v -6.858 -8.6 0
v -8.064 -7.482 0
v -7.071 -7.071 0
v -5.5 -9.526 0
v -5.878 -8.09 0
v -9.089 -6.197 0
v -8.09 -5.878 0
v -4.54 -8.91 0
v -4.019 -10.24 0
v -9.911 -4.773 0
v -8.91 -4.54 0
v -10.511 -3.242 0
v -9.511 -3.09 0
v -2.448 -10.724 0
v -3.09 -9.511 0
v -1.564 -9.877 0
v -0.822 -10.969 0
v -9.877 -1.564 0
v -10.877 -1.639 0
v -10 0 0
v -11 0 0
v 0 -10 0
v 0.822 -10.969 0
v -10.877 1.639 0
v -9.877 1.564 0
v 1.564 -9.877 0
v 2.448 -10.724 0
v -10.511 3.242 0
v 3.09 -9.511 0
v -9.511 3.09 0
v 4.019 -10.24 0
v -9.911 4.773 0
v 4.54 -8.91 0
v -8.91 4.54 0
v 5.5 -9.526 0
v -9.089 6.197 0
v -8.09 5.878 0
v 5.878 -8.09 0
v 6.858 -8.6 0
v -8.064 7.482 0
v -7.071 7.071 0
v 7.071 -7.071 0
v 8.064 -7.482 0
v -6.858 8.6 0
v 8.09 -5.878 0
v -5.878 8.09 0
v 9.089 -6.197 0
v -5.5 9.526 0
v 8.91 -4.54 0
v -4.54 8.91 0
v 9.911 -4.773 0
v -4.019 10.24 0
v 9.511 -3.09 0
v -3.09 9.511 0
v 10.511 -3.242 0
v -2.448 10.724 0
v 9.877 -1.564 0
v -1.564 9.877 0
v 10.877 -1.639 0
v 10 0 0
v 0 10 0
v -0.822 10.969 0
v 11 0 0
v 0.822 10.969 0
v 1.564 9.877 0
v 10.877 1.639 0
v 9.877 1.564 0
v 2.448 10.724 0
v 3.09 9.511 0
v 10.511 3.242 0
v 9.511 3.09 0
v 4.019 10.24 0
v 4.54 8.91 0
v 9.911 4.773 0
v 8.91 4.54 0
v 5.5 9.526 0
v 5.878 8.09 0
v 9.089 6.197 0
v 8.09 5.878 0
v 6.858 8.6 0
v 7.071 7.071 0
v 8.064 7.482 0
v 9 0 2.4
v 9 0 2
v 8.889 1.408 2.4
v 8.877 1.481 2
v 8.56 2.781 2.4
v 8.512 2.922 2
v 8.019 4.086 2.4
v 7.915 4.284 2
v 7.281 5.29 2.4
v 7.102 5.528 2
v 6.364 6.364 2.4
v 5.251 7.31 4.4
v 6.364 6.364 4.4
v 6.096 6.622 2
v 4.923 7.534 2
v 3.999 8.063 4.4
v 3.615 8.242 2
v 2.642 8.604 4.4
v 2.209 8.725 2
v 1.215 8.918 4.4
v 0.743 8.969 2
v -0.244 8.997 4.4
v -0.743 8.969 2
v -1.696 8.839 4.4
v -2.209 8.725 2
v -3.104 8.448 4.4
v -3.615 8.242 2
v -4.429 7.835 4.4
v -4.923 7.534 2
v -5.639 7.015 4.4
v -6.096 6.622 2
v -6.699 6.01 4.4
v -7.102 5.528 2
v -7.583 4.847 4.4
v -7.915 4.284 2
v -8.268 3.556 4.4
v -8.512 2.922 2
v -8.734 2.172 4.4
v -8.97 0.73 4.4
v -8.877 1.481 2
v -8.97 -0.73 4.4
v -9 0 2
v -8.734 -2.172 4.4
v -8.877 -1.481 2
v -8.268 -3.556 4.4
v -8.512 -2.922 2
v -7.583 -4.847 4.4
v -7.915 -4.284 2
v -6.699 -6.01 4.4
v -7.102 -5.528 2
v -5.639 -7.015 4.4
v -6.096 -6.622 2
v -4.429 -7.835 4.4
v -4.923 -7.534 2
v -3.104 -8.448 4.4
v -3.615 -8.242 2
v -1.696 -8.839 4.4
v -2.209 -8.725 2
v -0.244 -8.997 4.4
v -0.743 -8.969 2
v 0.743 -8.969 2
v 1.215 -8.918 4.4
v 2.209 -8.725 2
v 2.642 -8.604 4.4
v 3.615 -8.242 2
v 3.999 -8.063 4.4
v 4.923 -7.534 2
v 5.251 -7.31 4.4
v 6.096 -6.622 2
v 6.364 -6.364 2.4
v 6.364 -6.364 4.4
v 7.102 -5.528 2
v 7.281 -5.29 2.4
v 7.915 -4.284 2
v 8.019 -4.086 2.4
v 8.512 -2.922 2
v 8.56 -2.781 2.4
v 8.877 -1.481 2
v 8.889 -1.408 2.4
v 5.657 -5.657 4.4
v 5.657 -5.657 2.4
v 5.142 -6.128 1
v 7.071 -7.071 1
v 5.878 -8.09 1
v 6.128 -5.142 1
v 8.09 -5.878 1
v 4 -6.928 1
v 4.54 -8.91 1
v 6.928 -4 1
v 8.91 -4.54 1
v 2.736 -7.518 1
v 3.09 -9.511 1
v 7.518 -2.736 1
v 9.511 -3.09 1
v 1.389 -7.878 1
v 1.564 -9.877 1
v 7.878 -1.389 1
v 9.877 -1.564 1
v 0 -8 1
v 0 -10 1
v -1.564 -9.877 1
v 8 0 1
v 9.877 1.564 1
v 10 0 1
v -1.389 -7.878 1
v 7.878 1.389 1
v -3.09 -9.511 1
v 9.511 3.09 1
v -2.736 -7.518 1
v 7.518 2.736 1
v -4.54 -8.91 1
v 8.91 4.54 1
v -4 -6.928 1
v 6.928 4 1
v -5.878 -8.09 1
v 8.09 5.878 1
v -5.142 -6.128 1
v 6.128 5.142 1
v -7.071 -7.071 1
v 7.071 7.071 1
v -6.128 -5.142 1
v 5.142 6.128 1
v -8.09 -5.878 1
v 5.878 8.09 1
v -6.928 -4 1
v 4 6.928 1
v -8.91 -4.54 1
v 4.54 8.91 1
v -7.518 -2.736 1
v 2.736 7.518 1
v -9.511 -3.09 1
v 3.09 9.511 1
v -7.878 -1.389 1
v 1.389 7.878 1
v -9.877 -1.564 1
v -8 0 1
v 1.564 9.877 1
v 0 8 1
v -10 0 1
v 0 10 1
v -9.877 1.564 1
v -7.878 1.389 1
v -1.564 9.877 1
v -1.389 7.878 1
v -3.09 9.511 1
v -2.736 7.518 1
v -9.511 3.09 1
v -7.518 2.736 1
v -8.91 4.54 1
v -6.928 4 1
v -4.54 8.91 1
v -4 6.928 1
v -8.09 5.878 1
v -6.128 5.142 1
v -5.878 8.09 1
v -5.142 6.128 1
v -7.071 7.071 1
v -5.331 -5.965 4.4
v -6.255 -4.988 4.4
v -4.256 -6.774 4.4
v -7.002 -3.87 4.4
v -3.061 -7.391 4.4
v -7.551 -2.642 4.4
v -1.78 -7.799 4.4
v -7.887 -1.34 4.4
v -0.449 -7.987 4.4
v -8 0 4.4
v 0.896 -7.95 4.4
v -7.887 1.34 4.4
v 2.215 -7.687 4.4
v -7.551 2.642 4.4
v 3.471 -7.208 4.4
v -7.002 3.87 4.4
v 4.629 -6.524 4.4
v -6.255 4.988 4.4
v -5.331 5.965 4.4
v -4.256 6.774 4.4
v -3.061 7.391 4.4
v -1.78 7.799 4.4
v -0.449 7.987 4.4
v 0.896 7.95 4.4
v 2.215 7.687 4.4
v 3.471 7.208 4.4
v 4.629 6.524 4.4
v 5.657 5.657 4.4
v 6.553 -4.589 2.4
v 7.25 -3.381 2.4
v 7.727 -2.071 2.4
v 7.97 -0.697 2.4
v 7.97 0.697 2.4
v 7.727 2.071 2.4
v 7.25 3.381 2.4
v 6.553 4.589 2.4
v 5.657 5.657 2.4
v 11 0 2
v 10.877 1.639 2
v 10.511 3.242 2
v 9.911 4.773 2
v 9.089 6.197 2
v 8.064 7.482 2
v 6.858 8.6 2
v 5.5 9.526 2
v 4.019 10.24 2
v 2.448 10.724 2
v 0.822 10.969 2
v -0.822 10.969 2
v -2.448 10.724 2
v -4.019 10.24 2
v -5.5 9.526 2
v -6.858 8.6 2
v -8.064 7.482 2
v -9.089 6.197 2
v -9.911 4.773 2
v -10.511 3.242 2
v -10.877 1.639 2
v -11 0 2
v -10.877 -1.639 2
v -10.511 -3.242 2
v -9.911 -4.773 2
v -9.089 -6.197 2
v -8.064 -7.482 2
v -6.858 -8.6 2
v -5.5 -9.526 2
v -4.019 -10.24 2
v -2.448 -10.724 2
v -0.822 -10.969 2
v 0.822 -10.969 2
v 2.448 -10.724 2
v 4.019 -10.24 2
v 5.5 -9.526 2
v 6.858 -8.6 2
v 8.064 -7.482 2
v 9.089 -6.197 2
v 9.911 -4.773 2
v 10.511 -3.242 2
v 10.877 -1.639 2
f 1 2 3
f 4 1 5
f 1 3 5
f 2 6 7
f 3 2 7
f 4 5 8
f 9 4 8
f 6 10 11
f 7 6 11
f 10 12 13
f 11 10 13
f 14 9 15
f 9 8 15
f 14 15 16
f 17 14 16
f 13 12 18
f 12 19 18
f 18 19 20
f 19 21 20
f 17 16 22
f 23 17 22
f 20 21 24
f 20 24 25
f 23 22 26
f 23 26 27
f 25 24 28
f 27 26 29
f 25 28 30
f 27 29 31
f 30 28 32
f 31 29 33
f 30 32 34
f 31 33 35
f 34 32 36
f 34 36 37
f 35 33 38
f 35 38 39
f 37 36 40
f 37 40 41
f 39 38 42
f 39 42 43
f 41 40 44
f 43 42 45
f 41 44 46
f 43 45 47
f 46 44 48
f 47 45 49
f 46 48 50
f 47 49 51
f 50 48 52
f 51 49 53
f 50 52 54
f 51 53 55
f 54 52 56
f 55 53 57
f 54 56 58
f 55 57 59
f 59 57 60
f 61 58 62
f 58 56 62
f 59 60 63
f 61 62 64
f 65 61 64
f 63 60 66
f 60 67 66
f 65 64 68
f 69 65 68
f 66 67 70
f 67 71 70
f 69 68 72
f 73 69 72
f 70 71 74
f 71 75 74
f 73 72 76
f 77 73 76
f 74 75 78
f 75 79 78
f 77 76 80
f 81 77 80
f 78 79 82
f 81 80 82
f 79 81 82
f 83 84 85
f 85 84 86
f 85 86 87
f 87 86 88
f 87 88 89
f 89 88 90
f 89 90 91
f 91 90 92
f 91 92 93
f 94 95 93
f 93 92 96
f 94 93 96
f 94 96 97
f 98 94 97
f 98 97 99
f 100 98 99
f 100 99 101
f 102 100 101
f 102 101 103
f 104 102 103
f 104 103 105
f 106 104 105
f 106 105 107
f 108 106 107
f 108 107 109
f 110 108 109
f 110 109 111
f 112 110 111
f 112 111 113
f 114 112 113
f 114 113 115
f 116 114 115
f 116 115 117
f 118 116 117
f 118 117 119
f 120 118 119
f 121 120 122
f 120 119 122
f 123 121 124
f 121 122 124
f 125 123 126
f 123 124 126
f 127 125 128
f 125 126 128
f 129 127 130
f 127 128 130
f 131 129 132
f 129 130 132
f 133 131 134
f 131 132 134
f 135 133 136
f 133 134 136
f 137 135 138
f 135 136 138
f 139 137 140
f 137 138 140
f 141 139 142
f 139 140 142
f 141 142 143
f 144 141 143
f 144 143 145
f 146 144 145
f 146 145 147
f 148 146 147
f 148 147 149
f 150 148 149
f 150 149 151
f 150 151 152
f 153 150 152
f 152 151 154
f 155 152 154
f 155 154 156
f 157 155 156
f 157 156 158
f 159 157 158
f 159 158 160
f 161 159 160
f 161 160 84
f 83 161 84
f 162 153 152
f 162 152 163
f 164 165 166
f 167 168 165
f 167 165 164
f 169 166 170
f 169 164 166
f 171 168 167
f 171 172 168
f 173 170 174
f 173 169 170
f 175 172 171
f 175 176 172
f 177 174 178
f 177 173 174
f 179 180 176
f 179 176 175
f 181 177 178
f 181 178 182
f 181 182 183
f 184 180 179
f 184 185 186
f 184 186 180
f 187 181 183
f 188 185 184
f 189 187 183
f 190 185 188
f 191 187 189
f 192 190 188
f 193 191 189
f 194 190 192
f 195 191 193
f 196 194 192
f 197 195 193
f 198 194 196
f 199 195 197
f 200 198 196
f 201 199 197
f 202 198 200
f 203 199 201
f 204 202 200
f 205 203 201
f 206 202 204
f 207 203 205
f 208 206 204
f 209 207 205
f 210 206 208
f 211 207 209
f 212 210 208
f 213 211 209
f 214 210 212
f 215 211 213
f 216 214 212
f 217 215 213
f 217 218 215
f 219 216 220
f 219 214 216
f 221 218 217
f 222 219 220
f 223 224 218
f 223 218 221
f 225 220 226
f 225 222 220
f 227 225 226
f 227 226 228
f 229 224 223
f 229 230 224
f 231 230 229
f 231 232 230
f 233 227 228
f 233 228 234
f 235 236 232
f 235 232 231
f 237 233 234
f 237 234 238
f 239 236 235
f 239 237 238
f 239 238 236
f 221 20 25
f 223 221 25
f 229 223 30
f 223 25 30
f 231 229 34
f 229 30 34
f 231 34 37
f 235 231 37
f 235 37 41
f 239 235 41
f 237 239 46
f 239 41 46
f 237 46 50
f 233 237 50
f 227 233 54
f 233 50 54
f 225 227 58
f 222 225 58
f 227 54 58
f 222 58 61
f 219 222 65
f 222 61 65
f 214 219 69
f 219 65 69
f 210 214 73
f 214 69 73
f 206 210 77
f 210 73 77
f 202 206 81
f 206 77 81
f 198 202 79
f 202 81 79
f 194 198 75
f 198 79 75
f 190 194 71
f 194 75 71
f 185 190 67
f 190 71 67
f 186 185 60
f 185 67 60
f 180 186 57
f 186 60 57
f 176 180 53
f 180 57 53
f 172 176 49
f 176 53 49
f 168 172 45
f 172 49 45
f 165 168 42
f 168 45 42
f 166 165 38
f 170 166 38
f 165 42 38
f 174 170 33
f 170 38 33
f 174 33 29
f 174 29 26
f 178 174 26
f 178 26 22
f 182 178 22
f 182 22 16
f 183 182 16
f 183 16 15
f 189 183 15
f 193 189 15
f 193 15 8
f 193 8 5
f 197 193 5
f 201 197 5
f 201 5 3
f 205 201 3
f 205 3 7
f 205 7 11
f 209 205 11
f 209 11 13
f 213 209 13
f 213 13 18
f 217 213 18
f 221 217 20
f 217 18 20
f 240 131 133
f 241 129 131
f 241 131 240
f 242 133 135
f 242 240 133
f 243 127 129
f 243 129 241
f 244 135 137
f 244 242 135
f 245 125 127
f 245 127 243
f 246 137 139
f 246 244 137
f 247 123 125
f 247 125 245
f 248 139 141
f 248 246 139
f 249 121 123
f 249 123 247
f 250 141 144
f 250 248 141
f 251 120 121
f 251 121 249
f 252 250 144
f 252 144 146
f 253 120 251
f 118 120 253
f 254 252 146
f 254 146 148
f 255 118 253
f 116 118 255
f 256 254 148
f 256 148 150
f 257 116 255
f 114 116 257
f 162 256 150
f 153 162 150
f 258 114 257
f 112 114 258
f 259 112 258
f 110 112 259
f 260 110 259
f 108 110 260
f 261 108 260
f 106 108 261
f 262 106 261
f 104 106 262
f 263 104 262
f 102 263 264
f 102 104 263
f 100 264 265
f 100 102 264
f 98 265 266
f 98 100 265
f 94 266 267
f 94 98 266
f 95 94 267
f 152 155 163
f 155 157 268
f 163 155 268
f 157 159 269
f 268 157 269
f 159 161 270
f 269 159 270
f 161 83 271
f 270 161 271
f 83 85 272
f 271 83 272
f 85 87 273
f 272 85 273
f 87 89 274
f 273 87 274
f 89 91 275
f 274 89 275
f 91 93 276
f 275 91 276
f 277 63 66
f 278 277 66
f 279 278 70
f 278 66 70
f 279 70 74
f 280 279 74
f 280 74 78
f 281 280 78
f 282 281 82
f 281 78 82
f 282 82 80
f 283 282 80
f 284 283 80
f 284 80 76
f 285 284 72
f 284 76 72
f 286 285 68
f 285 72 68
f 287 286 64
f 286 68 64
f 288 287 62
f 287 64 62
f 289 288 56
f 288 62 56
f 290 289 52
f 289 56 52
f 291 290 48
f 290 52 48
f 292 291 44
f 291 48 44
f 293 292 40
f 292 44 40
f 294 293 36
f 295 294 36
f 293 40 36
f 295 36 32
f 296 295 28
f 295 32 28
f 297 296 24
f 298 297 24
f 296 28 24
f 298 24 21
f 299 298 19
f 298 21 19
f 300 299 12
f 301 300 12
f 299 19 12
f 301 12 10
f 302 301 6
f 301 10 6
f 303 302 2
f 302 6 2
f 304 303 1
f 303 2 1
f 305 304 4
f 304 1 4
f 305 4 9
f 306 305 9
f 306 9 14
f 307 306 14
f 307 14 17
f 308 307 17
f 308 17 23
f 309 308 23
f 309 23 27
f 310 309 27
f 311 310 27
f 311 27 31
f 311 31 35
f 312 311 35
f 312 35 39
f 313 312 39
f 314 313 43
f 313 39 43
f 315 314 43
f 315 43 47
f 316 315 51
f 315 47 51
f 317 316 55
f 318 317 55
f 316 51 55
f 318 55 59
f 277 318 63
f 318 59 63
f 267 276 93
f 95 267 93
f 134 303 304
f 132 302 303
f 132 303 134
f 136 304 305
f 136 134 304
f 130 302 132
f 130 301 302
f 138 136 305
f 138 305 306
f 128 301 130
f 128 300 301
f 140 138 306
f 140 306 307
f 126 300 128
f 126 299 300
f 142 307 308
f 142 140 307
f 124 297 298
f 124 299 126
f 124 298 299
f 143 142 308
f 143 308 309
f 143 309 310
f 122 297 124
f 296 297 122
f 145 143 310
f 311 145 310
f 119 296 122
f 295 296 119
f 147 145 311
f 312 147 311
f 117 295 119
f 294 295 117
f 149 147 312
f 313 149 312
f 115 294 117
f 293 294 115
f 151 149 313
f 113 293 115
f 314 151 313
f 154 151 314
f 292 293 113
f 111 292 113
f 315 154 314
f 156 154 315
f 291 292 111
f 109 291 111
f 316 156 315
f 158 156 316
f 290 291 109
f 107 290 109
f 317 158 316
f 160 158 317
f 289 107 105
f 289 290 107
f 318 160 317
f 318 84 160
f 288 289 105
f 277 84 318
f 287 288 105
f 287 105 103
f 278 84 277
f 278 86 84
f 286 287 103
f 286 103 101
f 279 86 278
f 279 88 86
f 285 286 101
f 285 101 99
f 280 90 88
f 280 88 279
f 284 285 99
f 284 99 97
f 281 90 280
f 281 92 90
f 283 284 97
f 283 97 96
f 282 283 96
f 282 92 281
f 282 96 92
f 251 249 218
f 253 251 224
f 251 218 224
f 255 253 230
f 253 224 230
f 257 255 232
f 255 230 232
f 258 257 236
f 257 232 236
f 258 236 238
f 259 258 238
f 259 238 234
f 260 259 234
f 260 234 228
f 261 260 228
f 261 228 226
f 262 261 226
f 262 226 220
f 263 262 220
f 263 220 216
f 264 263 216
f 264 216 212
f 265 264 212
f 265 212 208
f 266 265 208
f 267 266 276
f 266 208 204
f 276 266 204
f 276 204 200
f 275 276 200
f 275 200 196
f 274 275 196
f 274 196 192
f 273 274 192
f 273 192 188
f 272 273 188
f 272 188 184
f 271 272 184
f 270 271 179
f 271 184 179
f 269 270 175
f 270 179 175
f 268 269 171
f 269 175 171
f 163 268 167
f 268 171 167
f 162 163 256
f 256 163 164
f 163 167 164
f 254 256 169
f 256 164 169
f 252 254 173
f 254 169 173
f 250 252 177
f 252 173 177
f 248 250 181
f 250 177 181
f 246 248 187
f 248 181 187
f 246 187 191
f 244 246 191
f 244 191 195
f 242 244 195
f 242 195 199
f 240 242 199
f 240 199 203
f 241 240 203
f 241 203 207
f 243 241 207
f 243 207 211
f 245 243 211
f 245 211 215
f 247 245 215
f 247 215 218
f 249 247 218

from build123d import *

# Parameters (mm, degrees)
SKETCH_1_R          = 11
EXTRUDE_1_DEPTH     = 2
SKETCH_2_R          = 9
EXTRUDE_2_DEPTH     = 2.4
SKETCH_3_R          = 10
CUT_EXTRUDE_1_DEPTH = 1
SKETCH_4_R          = 8
CUT_EXTRUDE_2_DEPTH = 10
CUT_EXTRUDE_3_DEPTH = 2


with BuildPart() as part:
    # 草图1 → 凸台-拉伸1 (new body)
    with BuildSketch(Plane.XY):
        Circle(SKETCH_1_R)
    extrude(amount=EXTRUDE_1_DEPTH)

    # 草图2 → 凸台-拉伸2 (add)
    with BuildSketch(Plane.XY.offset(2)):
        Circle(SKETCH_2_R)
    extrude(amount=EXTRUDE_2_DEPTH)

    # 草图3 → 切除-拉伸1 (cut)
    with BuildSketch(Plane(origin=(0, 0, 0), x_dir=(-1, 0, 0), z_dir=(0, 0, -1))):
        Circle(SKETCH_3_R)
    extrude(amount=-CUT_EXTRUDE_1_DEPTH, mode=Mode.SUBTRACT)

    # 草图4 → 切除-拉伸2 (cut)
    with BuildSketch(Plane(origin=(0, 0, 1), x_dir=(-1, 0, 0), z_dir=(0, 0, -1))):
        Circle(SKETCH_4_R)
    extrude(amount=-CUT_EXTRUDE_2_DEPTH, mode=Mode.SUBTRACT)

    # 草图5 → 切除-拉伸3 (cut)
    with BuildSketch(Plane.XY.offset(4.4)):
        with BuildLine():
            Line((0, 0), (6.363961031, 6.363961031))
            ThreePointArc((6.363961031, 6.363961031), (9, 0), (6.363961031, -6.363961031))
            Line((6.363961031, -6.363961031), (0, 0))
        make_face()
    extrude(amount=-CUT_EXTRUDE_3_DEPTH, mode=Mode.SUBTRACT)


solid = part.part
